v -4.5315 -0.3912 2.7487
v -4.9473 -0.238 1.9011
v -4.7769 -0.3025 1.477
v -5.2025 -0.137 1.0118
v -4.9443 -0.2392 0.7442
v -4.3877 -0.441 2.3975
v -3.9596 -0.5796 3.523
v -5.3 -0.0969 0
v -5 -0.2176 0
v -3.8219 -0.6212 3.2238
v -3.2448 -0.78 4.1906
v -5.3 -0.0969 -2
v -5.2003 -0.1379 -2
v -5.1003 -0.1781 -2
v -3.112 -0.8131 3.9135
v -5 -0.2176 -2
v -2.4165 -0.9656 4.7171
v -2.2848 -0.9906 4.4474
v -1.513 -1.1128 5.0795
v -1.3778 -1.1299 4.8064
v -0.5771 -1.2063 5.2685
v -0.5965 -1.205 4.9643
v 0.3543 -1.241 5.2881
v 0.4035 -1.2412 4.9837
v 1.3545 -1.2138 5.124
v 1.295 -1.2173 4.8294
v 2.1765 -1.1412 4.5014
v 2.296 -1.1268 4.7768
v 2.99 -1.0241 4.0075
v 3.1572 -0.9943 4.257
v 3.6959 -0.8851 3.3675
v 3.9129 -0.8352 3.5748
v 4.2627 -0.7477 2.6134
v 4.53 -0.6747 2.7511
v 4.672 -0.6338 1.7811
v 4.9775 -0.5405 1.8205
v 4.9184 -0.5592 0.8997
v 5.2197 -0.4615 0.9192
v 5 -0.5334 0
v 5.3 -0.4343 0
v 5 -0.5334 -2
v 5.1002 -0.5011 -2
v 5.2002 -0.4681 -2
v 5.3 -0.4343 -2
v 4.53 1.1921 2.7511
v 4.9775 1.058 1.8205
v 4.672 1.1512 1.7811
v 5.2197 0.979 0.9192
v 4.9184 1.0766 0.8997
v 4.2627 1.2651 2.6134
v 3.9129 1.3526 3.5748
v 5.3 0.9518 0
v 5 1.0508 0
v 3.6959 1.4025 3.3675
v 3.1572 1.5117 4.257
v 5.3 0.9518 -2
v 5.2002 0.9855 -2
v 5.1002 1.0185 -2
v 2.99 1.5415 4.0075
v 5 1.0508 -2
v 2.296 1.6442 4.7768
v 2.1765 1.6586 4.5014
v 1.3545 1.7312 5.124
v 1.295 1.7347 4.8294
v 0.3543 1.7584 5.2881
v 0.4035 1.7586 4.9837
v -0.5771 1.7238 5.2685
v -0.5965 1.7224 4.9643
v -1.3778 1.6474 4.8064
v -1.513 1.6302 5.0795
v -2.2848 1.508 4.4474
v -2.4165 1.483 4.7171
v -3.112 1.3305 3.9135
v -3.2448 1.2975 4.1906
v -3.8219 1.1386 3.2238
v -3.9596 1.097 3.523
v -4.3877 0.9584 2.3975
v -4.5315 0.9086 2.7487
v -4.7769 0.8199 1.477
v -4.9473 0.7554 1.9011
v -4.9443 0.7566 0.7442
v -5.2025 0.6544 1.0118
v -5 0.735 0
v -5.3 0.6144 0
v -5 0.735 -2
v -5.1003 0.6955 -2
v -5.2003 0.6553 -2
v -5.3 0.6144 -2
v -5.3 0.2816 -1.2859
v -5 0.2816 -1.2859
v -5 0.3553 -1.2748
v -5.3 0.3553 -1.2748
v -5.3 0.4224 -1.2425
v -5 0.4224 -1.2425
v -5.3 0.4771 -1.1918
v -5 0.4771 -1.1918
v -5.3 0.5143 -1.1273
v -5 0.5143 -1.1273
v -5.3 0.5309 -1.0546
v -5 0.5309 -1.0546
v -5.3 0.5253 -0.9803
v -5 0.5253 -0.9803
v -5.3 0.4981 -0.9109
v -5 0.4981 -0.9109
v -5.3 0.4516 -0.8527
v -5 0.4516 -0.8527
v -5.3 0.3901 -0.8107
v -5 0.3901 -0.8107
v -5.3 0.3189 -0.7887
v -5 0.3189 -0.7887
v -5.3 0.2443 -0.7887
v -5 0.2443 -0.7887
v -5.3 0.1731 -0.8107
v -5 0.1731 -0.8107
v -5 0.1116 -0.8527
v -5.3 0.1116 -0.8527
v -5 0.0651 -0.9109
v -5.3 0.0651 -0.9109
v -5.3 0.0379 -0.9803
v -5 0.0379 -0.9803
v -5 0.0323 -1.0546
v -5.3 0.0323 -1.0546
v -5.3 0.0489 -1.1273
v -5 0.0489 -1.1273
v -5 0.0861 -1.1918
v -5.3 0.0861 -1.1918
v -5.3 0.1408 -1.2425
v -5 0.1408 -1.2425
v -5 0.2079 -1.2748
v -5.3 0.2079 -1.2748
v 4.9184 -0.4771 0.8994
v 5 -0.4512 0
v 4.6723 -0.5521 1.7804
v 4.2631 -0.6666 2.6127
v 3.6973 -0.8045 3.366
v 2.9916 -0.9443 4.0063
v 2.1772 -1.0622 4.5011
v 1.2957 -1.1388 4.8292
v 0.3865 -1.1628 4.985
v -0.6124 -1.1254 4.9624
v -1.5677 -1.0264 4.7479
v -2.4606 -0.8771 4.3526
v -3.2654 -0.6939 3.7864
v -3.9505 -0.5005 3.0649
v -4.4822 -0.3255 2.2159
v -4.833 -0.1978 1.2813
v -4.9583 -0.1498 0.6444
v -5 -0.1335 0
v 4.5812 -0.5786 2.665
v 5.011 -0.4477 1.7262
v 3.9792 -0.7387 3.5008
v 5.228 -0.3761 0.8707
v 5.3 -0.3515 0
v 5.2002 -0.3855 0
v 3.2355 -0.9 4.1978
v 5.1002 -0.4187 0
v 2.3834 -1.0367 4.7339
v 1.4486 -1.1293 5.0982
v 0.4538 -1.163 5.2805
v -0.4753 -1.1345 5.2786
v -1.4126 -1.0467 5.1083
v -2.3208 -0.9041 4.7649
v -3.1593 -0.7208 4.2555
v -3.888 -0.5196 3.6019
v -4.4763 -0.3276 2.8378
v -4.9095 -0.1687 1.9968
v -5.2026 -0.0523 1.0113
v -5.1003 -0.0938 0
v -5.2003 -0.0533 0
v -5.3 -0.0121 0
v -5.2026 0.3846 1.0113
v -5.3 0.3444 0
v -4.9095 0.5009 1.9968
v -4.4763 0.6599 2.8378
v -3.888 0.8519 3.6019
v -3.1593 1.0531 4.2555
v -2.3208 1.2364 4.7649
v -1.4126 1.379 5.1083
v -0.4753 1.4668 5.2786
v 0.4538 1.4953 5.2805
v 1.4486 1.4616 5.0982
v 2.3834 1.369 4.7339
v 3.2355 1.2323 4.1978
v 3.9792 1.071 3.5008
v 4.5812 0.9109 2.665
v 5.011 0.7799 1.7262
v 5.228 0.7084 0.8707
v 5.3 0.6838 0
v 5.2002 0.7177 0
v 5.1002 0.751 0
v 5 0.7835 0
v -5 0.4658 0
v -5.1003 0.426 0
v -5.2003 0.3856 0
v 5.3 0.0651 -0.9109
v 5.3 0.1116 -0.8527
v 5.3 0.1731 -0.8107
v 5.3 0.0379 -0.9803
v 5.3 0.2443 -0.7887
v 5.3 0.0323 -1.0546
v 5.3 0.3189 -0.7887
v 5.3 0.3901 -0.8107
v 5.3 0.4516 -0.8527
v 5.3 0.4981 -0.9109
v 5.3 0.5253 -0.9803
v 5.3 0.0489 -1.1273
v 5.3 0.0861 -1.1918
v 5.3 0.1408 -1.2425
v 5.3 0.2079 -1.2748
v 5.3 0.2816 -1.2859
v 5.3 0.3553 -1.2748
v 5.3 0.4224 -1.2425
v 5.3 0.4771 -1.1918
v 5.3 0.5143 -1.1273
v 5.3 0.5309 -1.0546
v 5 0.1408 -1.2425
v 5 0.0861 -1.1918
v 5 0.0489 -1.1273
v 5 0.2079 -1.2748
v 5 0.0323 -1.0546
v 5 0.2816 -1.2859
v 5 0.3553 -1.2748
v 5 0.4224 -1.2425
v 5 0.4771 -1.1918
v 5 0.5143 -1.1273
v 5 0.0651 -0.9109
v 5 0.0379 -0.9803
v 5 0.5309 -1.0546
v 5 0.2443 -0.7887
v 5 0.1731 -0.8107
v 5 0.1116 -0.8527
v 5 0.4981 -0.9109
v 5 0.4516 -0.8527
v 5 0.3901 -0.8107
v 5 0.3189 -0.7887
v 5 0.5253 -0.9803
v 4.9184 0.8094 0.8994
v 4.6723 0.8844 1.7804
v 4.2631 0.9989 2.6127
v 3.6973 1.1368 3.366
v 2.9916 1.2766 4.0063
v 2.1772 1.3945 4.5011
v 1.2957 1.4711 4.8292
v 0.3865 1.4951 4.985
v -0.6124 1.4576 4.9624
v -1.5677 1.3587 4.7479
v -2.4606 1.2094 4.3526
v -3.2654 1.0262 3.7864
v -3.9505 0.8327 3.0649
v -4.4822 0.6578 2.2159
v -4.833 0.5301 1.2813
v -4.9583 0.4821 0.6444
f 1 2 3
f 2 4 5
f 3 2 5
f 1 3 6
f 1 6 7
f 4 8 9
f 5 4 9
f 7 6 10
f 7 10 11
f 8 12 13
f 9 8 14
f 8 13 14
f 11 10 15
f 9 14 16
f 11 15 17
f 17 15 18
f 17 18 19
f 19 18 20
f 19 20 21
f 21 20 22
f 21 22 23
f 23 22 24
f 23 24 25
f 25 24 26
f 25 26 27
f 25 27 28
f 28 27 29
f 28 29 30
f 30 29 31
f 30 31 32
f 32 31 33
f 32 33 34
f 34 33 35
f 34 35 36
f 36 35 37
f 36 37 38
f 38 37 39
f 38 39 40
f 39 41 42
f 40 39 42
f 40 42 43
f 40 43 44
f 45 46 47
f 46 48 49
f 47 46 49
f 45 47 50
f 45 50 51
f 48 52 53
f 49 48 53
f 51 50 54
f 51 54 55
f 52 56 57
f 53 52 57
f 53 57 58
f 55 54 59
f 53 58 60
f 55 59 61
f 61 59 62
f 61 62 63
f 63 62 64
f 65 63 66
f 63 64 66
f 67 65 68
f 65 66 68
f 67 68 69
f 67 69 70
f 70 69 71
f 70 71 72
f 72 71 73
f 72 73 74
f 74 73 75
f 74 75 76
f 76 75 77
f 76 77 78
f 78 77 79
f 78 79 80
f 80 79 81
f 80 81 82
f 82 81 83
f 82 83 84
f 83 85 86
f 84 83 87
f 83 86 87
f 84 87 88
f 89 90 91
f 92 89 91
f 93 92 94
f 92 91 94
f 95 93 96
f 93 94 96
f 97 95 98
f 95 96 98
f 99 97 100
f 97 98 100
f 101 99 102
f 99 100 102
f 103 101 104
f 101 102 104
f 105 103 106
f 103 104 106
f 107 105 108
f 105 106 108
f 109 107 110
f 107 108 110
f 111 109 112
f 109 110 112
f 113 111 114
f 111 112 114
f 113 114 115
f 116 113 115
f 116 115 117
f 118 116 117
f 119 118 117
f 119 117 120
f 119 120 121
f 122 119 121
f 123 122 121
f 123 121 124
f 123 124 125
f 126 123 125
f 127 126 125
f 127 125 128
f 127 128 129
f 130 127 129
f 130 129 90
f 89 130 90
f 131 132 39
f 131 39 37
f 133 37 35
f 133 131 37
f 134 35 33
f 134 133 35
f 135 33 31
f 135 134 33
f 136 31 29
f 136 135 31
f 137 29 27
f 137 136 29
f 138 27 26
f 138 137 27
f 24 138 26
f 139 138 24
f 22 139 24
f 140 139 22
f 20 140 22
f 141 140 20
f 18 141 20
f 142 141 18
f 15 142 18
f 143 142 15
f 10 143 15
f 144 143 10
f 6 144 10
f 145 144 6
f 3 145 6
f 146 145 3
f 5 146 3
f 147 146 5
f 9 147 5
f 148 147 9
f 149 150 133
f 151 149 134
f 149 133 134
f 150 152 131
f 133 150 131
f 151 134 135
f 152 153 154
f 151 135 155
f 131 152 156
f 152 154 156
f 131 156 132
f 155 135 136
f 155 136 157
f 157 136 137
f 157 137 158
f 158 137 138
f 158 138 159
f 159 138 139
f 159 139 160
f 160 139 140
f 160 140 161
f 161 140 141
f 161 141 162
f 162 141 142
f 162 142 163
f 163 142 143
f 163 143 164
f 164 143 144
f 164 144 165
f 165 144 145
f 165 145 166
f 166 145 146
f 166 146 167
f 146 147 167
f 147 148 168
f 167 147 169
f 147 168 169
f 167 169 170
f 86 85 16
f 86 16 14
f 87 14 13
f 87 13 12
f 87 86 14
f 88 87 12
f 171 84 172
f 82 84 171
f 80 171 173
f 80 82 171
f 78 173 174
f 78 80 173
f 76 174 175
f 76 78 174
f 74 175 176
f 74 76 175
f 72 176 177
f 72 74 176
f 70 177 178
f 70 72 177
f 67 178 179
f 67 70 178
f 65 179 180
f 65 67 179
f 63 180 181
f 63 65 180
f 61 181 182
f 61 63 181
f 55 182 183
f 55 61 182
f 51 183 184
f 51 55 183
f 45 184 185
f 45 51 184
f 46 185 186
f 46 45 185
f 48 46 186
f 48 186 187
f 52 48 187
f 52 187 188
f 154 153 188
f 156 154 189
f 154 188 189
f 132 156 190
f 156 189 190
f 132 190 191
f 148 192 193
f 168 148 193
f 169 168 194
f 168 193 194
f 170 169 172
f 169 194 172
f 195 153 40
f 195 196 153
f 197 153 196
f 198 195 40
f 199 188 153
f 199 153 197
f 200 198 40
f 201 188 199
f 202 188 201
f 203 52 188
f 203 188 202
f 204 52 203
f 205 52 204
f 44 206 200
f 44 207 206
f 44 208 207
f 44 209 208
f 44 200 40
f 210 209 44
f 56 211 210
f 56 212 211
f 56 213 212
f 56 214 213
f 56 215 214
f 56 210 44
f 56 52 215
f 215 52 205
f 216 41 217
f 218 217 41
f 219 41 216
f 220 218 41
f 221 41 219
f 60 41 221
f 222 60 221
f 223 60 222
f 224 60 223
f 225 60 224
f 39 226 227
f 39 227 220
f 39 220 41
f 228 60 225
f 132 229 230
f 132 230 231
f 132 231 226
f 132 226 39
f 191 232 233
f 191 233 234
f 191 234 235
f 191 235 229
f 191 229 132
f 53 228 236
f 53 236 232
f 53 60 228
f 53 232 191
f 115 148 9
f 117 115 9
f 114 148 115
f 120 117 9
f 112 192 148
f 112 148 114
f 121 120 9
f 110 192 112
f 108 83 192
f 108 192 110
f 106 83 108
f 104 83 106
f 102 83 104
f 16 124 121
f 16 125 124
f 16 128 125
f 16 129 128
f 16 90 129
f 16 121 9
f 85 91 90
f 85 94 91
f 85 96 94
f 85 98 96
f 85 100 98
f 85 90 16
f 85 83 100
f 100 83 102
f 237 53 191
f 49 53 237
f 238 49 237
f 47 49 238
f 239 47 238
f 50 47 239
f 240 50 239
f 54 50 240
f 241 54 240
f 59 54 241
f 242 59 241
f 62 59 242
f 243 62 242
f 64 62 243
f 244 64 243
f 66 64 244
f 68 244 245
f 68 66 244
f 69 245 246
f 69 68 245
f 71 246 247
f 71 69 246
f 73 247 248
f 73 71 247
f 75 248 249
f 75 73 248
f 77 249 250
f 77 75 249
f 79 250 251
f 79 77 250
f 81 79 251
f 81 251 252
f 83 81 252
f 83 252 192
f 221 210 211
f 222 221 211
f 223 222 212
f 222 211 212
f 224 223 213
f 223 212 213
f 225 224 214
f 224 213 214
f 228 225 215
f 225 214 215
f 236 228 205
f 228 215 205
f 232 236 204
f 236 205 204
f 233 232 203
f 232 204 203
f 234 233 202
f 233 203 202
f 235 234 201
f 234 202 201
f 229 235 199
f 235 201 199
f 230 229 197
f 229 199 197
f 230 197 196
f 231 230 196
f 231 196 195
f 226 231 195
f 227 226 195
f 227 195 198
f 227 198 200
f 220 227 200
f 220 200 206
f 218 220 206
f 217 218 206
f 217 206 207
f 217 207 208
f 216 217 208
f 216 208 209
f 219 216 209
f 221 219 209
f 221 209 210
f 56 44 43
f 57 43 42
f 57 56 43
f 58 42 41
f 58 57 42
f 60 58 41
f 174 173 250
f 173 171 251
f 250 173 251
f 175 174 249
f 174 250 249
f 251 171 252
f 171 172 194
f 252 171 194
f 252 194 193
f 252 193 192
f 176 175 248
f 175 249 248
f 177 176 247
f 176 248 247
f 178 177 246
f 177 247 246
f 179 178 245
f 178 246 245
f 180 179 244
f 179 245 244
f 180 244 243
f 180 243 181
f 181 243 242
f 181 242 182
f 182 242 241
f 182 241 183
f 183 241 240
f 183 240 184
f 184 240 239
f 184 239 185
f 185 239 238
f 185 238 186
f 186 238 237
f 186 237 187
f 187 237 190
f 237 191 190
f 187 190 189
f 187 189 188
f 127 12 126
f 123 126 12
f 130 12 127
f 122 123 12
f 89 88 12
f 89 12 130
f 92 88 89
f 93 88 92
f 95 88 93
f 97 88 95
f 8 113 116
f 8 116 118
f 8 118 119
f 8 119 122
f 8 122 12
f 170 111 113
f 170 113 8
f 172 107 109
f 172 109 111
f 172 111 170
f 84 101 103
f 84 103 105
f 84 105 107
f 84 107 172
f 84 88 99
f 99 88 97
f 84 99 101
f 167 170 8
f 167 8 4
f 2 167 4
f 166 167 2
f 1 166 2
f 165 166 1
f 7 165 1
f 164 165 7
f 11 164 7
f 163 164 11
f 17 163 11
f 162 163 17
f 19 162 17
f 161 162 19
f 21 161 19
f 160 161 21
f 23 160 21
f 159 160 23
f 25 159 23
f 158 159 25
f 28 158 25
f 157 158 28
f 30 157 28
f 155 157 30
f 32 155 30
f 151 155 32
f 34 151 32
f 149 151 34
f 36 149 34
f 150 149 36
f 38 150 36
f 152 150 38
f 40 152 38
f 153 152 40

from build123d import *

# Parameters (mm, degrees)
EXTRUDE_1_DEPTH          = 5
CUT_EXTRUDE_1_DEPTH      = 10.009994451
CUT_EXTRUDE_1_DEPTH_BACK = 10.009994451
SKETCH_2_OUTSIDE_W       = 15.86
SKETCH_2_OUTSIDE_H       = 15.26
CUT_EXTRUDE_3_DEPTH      = 8.698899932
SKETCH_4_R               = 0.25
CUT_EXTRUDE_4_DEPTH      = 12.980945757


with BuildPart() as part:
    # 草图1 → 拉伸-薄壁1 (new, symmetric)
    with BuildSketch(Plane(origin=(0, 0, 0), x_dir=(1, 0, 0), z_dir=(0, 1, 0))):
        with BuildLine():
            Line((5, 2), (5, 0))
            ThreePointArc((5, 0), (0, -5), (-5, 0))
            Line((-5, 0), (-5, 2))
            Line((-5, 2), (-5.3, 2))
            Line((-5.3, 2), (-5.3, 0))
            ThreePointArc((-5.3, 0), (0, -5.3), (5.3, 0))
            Line((5.3, 0), (5.3, 2))
            Line((5.3, 2), (5, 2))
        make_face()
    extrude(amount=EXTRUDE_1_DEPTH, both=True)

    # 草图2 outside → 切除-拉伸1 (cut, two sides: drawn at the far end of the back side and taken through both)
    with BuildSketch(Plane.XY.offset(-CUT_EXTRUDE_1_DEPTH_BACK)):
        Rectangle(SKETCH_2_OUTSIDE_W, SKETCH_2_OUTSIDE_H)
        with BuildLine():
            ThreePointArc((-6.091957351, 0.258709088), (0.446391065, -1.241290912), (6.98473948, 0.258709088))
            ThreePointArc((6.98473948, 0.258709088), (0.446391065, 1.758709088), (-6.091957351, 0.258709088))
        make_face(mode=Mode.SUBTRACT)
    extrude(amount=CUT_EXTRUDE_1_DEPTH + CUT_EXTRUDE_1_DEPTH_BACK, mode=Mode.SUBTRACT)

    # 草图3 → 切除-拉伸3 (cut, through all)
    with BuildSketch(Plane.XY):
        with BuildLine():
            ThreePointArc((-5.709798578, 0.166145361), (0.446391065, 1.49525914), (6.602580707, 0.166145361))
            Line((6.602580707, 0.166145361), (-5.709798578, 0.166145361))
        make_face()
        with BuildLine():
            Line((-5.709798578, 0.166145361), (6.602580707, 0.166145361))
            ThreePointArc((6.602580707, 0.166145361), (0.446391065, -1.162968417), (-5.709798578, 0.166145361))
        make_face()
    extrude(amount=CUT_EXTRUDE_3_DEPTH, mode=Mode.SUBTRACT)

    # 草图4 → 切除-拉伸4 (cut, through all)
    with BuildSketch(Plane(origin=(5.3, 0, 0), x_dir=(0, 0, -1), z_dir=(1, 0, 0))):
        with Locations((1.035921509, 0.281600465)):
            Circle(SKETCH_4_R)
    extrude(amount=-CUT_EXTRUDE_4_DEPTH, mode=Mode.SUBTRACT)


solid = part.part
